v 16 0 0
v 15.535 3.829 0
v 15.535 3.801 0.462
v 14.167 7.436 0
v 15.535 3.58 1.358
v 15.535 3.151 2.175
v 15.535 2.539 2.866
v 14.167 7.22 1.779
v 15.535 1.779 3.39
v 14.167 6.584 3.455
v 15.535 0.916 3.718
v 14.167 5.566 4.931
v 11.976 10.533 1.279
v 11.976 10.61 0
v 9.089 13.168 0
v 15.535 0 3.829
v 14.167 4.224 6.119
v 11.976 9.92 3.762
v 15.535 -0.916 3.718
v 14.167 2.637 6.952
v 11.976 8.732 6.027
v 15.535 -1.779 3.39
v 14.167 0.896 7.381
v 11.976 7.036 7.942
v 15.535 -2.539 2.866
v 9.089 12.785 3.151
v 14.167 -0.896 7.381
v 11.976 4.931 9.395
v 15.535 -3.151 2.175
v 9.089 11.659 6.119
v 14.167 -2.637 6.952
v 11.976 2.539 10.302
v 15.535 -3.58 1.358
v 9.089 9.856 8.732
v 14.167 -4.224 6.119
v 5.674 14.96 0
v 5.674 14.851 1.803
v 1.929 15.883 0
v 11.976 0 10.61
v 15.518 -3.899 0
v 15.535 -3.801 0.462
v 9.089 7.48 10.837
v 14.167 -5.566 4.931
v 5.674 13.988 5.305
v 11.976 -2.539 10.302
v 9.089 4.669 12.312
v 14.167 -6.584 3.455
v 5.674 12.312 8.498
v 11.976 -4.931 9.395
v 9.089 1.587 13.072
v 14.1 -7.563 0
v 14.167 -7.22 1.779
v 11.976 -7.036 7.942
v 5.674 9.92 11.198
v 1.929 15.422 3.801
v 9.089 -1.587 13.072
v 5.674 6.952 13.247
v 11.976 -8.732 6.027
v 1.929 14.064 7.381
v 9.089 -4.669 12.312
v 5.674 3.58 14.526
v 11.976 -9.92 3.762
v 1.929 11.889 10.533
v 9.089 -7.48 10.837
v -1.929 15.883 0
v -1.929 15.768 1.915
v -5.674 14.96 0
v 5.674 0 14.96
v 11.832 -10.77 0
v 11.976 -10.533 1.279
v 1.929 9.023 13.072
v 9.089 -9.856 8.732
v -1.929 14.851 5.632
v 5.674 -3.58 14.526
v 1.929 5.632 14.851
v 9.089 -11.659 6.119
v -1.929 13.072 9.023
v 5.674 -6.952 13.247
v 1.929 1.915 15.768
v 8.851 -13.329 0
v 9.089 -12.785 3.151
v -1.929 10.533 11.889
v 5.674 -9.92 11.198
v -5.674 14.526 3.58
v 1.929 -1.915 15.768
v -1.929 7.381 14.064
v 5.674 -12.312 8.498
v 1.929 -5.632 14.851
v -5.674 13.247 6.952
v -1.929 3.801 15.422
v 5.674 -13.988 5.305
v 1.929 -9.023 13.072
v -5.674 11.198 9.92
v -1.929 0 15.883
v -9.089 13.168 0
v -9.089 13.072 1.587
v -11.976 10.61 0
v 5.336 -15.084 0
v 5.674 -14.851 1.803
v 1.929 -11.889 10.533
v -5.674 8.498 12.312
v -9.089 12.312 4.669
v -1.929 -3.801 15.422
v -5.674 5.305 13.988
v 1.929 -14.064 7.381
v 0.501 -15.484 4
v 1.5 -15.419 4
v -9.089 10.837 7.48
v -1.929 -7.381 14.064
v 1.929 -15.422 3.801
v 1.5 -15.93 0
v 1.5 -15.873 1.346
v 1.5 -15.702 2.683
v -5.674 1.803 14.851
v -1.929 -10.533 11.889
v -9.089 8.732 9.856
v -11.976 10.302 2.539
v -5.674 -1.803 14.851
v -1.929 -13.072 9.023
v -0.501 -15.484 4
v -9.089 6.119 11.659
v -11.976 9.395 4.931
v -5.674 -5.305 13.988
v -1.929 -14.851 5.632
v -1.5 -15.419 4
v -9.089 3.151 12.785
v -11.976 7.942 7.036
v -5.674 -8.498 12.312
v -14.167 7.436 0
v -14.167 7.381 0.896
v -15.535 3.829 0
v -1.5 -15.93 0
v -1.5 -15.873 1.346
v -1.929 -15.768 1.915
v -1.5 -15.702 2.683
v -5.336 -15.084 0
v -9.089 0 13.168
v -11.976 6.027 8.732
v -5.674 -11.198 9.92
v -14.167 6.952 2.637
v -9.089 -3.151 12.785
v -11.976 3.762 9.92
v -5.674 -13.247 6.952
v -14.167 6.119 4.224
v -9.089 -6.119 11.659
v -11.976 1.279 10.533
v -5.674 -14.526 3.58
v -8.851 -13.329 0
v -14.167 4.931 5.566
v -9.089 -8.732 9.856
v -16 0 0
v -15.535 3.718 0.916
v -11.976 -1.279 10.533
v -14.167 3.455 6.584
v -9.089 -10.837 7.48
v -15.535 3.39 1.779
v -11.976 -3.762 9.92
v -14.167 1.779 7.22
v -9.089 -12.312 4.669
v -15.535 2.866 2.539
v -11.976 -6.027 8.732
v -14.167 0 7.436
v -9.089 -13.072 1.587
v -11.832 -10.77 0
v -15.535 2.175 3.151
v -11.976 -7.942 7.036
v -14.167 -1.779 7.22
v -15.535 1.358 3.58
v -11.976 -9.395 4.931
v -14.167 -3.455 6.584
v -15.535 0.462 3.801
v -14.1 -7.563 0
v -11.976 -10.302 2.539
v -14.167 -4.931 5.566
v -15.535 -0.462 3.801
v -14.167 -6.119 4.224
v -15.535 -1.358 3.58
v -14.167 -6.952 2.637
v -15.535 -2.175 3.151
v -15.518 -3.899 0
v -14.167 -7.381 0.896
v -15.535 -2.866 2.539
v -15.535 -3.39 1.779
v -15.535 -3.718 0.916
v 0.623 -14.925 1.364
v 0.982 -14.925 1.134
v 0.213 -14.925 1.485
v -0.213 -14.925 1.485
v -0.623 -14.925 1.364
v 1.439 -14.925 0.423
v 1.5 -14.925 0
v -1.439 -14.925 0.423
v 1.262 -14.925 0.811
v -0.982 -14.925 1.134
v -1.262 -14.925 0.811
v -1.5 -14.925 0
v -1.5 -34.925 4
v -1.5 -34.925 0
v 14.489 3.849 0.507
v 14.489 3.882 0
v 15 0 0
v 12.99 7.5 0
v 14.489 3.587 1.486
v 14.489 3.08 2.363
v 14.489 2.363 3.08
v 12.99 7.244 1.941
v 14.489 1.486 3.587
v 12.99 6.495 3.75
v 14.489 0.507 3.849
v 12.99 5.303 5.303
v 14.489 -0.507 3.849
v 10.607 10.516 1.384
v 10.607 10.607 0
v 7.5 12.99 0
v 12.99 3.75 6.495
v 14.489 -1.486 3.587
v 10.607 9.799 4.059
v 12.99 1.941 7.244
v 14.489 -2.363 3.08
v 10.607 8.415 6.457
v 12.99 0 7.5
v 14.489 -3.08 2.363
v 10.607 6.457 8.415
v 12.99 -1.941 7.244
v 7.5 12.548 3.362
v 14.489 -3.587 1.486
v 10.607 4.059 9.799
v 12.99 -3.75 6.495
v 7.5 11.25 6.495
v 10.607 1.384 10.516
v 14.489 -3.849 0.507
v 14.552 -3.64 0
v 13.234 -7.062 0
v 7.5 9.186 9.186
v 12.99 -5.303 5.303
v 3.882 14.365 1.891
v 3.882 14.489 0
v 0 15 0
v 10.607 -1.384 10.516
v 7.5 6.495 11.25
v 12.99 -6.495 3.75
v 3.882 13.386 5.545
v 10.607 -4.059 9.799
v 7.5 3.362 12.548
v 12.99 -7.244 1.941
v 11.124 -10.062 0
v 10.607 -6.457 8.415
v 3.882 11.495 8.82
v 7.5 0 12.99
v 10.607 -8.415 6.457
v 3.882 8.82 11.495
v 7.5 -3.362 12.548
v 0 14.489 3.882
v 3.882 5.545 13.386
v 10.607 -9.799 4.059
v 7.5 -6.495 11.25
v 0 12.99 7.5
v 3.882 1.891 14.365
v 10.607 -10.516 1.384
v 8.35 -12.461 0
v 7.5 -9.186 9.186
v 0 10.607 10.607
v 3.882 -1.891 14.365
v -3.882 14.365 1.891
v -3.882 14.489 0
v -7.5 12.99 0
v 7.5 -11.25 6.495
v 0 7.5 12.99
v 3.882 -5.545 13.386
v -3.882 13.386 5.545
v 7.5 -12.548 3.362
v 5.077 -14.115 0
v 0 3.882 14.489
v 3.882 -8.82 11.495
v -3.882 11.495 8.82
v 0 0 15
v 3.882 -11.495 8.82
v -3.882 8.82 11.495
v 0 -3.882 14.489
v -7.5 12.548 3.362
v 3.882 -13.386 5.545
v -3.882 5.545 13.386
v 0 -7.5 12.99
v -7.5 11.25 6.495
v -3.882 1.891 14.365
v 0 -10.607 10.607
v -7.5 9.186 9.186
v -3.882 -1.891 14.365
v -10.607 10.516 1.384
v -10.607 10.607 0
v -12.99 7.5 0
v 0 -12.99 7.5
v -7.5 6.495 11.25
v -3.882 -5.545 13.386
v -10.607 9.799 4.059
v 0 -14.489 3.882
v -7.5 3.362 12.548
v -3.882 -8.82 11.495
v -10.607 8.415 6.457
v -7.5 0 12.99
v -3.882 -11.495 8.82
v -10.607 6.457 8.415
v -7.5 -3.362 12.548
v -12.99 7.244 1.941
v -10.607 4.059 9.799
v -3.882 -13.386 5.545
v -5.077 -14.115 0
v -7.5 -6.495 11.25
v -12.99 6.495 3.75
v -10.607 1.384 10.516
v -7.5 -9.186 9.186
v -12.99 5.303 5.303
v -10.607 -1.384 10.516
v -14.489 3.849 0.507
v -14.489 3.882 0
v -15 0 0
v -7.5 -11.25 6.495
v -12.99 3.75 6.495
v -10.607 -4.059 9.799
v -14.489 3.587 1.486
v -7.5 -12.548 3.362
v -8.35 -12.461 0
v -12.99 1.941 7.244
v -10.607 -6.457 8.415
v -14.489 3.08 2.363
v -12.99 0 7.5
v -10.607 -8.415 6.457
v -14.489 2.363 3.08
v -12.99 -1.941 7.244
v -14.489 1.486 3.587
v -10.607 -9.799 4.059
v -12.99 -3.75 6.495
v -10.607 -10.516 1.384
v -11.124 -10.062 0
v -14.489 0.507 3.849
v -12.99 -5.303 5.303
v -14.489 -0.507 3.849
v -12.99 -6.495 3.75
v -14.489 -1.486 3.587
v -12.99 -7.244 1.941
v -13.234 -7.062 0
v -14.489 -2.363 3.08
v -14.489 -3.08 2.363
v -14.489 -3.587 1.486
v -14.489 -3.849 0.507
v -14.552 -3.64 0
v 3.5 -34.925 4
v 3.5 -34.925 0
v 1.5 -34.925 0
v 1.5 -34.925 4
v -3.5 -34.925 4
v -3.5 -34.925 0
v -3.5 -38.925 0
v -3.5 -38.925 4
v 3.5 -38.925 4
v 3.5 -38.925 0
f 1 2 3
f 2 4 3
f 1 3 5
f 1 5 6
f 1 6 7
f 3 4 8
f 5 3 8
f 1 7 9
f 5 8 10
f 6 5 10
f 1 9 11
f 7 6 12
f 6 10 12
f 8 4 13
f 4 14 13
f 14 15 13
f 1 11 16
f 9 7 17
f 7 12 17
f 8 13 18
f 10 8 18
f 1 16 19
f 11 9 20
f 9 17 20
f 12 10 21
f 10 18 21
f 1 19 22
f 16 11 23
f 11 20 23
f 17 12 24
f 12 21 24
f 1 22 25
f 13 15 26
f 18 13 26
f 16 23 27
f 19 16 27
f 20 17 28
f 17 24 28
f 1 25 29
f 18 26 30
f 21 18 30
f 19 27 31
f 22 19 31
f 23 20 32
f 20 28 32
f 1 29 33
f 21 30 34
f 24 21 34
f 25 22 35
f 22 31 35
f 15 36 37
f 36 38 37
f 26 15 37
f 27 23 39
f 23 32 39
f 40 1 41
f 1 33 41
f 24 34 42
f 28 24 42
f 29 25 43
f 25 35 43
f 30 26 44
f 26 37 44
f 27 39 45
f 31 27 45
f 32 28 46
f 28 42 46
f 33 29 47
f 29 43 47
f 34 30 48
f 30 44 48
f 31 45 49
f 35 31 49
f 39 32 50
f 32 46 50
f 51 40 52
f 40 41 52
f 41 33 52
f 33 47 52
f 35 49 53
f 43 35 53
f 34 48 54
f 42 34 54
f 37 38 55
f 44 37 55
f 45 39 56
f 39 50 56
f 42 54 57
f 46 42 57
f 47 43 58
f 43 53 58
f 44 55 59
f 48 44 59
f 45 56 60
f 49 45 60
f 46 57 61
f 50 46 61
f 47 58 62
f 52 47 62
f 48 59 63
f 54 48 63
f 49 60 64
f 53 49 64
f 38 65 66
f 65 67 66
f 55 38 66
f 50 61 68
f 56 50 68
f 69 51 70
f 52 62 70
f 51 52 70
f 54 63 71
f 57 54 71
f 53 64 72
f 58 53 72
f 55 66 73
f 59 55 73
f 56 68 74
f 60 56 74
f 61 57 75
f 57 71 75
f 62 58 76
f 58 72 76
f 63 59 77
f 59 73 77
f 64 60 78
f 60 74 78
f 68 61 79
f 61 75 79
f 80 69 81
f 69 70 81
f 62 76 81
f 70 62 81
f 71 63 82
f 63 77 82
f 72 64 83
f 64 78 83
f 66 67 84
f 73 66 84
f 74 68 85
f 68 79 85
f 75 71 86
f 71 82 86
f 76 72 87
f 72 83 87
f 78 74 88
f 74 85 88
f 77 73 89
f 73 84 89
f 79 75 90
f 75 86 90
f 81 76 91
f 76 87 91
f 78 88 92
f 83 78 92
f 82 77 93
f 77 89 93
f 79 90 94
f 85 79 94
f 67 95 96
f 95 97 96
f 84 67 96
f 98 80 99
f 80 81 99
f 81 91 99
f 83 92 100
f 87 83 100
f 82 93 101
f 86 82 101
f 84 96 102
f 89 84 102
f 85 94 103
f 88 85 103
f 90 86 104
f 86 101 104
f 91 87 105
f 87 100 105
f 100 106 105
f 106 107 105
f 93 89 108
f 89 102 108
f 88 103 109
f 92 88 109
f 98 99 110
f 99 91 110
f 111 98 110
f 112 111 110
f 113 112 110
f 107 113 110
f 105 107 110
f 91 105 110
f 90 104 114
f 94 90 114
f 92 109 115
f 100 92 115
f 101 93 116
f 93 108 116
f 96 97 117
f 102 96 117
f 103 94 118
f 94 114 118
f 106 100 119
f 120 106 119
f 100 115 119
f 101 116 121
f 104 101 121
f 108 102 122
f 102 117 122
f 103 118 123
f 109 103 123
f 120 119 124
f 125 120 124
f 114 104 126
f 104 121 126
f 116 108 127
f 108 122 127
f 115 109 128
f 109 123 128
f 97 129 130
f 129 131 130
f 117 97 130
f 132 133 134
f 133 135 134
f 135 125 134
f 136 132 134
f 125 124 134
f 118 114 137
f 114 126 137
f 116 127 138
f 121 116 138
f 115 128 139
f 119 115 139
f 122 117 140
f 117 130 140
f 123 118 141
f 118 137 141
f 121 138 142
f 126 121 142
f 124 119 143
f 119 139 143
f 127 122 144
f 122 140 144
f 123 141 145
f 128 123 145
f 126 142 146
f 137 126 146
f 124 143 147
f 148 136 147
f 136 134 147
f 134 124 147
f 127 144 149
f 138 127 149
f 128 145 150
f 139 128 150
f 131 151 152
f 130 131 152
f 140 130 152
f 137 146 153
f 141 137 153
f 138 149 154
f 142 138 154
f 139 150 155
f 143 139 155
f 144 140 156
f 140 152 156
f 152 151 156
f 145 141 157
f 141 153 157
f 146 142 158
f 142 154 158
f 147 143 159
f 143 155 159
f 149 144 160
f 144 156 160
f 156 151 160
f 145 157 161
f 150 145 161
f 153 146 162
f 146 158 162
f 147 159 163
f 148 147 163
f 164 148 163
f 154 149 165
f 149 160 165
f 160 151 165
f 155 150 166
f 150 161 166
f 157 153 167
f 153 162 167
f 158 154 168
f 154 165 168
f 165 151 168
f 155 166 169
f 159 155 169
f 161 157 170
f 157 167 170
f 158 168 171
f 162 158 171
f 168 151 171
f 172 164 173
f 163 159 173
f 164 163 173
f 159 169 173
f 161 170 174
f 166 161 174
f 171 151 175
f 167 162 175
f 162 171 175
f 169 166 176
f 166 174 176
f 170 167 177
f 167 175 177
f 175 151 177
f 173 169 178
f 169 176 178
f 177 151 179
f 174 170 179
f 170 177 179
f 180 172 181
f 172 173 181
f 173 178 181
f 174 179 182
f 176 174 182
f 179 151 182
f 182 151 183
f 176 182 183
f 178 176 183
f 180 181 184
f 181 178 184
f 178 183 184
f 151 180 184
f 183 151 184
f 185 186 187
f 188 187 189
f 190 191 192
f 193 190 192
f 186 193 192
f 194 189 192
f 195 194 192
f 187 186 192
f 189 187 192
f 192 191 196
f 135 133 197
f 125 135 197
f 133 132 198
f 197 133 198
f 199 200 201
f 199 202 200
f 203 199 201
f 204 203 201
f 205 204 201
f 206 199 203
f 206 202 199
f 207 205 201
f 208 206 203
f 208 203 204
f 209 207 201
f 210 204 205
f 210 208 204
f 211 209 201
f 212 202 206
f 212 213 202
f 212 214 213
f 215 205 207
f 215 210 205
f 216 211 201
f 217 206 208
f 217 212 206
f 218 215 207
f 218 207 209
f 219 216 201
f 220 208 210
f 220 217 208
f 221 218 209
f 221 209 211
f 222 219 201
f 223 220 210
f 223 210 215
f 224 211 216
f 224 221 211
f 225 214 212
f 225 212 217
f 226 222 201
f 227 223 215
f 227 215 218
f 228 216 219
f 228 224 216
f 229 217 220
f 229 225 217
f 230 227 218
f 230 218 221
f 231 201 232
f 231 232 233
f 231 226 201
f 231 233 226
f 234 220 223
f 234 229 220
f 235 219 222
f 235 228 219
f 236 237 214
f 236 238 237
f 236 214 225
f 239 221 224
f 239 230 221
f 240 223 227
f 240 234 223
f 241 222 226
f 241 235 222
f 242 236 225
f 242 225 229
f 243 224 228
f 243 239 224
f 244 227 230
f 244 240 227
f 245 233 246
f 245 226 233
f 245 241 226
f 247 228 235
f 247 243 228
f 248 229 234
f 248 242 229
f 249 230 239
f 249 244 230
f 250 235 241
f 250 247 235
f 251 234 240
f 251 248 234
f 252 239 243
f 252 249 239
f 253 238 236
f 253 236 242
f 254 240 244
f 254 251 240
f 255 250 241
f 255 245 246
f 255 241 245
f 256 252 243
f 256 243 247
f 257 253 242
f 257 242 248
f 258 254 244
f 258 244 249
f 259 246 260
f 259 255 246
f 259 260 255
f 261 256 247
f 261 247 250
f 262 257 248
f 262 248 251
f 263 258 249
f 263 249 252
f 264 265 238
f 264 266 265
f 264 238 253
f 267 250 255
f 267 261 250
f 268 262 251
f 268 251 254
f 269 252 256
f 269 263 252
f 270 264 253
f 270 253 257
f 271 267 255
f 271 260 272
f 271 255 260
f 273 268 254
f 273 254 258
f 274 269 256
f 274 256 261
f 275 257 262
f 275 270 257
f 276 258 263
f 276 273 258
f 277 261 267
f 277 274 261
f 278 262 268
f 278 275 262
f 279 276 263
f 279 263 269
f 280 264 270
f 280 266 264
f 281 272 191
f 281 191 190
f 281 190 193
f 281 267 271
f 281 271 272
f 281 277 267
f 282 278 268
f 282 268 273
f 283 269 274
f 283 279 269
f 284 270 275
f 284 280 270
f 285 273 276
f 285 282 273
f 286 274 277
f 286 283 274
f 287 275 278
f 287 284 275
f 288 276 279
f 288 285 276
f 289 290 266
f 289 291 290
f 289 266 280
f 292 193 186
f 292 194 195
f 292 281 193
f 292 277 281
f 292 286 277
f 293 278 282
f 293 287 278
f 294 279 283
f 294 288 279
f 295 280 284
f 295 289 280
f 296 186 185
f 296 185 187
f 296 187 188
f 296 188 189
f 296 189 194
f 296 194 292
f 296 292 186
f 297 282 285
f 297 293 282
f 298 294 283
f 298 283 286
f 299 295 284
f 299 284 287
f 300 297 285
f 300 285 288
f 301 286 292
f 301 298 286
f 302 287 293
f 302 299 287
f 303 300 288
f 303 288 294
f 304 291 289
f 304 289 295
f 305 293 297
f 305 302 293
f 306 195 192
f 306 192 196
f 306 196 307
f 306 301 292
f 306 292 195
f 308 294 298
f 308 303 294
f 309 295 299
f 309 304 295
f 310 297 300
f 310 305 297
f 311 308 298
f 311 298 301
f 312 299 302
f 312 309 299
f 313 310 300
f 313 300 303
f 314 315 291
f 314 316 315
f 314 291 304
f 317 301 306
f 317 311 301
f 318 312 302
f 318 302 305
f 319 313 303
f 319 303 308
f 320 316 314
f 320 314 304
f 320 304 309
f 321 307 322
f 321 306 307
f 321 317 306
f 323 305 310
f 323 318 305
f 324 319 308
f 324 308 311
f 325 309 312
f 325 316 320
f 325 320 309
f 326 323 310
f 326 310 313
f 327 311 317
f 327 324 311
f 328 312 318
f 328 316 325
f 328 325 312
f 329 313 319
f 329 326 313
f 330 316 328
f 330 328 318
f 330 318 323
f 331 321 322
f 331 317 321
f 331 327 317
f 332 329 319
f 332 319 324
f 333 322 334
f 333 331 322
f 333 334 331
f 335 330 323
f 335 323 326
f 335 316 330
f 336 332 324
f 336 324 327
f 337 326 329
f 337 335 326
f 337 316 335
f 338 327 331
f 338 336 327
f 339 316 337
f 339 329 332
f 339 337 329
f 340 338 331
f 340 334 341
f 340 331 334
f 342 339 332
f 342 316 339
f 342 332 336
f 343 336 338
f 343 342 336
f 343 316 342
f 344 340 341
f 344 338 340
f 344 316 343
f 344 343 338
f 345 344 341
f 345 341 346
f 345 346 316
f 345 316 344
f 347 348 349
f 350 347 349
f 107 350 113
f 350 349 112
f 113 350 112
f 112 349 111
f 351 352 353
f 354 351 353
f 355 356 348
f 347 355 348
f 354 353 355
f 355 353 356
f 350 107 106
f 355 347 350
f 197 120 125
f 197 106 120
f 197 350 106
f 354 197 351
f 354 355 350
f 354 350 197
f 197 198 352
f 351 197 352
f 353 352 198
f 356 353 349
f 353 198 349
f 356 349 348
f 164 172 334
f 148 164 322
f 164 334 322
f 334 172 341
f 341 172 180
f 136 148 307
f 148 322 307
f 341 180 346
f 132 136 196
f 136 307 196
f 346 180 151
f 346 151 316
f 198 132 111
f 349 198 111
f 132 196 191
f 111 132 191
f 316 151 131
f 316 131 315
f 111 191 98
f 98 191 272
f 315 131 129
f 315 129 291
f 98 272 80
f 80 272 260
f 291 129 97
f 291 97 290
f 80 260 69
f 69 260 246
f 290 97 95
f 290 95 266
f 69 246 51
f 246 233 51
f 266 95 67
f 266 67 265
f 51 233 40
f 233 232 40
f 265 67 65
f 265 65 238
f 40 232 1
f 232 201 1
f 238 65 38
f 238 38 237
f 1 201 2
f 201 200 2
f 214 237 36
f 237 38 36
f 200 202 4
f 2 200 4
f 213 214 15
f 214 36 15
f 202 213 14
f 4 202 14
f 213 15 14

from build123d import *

# Parameters (mm, degrees)
REVOLUTION_ANGLE = 180
PAD_DEPTH        = 4


with BuildPart() as part:
    # Sketch → Revolution (revolve)
    with BuildSketch(Plane.XY):
        with BuildLine():
            ThreePointArc((16, 0), (0, 16), (-16, 0))
            Line((-16, 0), (-15, 0))
            ThreePointArc((15, 0), (0, 15), (-15, 0))
            Line((15, 0), (16, 0))
        make_face()
    revolve(axis=Axis((0, 0, 0), (1, 0, 0)), revolution_arc=REVOLUTION_ANGLE)

    # Sketch001 → Pad (new body)
    with BuildSketch(Plane(origin=(0, 0, 0), x_dir=(1, 0, 0), z_dir=(0, 0, -1))):
        Polygon((-1.5, 14.924812), (-1.5, 34.924812), (-3.5, 34.924812), (-3.5, 38.924812), (3.5, 38.924812), (3.5, 34.924812), (1.5, 34.924812), (1.5, 14.924812), align=None)
    extrude(amount=-PAD_DEPTH)


solid = part.part
